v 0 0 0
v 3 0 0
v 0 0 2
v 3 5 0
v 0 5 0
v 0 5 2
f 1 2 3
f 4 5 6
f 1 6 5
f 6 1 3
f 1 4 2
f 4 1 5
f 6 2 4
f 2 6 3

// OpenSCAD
//CC-BY-SA
//https://github.com/dannystaple/OpenSCAD-Parts-Library
//Draw a prism based on a 
//right angled triangle
//l - length of prism
//w - width of triangle
//h - height of triangle
module prism(l, w, h) {
       polyhedron(points=[
               [0,0,h],           // 0    front top corner
               [0,0,0],[w,0,0],   // 1, 2 front left & right bottom corners
               [0,l,h],           // 3    back top corner
               [0,l,0],[w,l,0]    // 4, 5 back left & right bottom corners
       ], faces=[ // points for all faces must be ordered clockwise when looking in
               [0,2,1],    // top face
               [3,4,5],    // base face
               [0,1,4,3],  // h face
               [1,2,5,4],  // w face
               [0,3,5,2],  // hypotenuse face
       ]);
}

prism(5, 3, 2);
